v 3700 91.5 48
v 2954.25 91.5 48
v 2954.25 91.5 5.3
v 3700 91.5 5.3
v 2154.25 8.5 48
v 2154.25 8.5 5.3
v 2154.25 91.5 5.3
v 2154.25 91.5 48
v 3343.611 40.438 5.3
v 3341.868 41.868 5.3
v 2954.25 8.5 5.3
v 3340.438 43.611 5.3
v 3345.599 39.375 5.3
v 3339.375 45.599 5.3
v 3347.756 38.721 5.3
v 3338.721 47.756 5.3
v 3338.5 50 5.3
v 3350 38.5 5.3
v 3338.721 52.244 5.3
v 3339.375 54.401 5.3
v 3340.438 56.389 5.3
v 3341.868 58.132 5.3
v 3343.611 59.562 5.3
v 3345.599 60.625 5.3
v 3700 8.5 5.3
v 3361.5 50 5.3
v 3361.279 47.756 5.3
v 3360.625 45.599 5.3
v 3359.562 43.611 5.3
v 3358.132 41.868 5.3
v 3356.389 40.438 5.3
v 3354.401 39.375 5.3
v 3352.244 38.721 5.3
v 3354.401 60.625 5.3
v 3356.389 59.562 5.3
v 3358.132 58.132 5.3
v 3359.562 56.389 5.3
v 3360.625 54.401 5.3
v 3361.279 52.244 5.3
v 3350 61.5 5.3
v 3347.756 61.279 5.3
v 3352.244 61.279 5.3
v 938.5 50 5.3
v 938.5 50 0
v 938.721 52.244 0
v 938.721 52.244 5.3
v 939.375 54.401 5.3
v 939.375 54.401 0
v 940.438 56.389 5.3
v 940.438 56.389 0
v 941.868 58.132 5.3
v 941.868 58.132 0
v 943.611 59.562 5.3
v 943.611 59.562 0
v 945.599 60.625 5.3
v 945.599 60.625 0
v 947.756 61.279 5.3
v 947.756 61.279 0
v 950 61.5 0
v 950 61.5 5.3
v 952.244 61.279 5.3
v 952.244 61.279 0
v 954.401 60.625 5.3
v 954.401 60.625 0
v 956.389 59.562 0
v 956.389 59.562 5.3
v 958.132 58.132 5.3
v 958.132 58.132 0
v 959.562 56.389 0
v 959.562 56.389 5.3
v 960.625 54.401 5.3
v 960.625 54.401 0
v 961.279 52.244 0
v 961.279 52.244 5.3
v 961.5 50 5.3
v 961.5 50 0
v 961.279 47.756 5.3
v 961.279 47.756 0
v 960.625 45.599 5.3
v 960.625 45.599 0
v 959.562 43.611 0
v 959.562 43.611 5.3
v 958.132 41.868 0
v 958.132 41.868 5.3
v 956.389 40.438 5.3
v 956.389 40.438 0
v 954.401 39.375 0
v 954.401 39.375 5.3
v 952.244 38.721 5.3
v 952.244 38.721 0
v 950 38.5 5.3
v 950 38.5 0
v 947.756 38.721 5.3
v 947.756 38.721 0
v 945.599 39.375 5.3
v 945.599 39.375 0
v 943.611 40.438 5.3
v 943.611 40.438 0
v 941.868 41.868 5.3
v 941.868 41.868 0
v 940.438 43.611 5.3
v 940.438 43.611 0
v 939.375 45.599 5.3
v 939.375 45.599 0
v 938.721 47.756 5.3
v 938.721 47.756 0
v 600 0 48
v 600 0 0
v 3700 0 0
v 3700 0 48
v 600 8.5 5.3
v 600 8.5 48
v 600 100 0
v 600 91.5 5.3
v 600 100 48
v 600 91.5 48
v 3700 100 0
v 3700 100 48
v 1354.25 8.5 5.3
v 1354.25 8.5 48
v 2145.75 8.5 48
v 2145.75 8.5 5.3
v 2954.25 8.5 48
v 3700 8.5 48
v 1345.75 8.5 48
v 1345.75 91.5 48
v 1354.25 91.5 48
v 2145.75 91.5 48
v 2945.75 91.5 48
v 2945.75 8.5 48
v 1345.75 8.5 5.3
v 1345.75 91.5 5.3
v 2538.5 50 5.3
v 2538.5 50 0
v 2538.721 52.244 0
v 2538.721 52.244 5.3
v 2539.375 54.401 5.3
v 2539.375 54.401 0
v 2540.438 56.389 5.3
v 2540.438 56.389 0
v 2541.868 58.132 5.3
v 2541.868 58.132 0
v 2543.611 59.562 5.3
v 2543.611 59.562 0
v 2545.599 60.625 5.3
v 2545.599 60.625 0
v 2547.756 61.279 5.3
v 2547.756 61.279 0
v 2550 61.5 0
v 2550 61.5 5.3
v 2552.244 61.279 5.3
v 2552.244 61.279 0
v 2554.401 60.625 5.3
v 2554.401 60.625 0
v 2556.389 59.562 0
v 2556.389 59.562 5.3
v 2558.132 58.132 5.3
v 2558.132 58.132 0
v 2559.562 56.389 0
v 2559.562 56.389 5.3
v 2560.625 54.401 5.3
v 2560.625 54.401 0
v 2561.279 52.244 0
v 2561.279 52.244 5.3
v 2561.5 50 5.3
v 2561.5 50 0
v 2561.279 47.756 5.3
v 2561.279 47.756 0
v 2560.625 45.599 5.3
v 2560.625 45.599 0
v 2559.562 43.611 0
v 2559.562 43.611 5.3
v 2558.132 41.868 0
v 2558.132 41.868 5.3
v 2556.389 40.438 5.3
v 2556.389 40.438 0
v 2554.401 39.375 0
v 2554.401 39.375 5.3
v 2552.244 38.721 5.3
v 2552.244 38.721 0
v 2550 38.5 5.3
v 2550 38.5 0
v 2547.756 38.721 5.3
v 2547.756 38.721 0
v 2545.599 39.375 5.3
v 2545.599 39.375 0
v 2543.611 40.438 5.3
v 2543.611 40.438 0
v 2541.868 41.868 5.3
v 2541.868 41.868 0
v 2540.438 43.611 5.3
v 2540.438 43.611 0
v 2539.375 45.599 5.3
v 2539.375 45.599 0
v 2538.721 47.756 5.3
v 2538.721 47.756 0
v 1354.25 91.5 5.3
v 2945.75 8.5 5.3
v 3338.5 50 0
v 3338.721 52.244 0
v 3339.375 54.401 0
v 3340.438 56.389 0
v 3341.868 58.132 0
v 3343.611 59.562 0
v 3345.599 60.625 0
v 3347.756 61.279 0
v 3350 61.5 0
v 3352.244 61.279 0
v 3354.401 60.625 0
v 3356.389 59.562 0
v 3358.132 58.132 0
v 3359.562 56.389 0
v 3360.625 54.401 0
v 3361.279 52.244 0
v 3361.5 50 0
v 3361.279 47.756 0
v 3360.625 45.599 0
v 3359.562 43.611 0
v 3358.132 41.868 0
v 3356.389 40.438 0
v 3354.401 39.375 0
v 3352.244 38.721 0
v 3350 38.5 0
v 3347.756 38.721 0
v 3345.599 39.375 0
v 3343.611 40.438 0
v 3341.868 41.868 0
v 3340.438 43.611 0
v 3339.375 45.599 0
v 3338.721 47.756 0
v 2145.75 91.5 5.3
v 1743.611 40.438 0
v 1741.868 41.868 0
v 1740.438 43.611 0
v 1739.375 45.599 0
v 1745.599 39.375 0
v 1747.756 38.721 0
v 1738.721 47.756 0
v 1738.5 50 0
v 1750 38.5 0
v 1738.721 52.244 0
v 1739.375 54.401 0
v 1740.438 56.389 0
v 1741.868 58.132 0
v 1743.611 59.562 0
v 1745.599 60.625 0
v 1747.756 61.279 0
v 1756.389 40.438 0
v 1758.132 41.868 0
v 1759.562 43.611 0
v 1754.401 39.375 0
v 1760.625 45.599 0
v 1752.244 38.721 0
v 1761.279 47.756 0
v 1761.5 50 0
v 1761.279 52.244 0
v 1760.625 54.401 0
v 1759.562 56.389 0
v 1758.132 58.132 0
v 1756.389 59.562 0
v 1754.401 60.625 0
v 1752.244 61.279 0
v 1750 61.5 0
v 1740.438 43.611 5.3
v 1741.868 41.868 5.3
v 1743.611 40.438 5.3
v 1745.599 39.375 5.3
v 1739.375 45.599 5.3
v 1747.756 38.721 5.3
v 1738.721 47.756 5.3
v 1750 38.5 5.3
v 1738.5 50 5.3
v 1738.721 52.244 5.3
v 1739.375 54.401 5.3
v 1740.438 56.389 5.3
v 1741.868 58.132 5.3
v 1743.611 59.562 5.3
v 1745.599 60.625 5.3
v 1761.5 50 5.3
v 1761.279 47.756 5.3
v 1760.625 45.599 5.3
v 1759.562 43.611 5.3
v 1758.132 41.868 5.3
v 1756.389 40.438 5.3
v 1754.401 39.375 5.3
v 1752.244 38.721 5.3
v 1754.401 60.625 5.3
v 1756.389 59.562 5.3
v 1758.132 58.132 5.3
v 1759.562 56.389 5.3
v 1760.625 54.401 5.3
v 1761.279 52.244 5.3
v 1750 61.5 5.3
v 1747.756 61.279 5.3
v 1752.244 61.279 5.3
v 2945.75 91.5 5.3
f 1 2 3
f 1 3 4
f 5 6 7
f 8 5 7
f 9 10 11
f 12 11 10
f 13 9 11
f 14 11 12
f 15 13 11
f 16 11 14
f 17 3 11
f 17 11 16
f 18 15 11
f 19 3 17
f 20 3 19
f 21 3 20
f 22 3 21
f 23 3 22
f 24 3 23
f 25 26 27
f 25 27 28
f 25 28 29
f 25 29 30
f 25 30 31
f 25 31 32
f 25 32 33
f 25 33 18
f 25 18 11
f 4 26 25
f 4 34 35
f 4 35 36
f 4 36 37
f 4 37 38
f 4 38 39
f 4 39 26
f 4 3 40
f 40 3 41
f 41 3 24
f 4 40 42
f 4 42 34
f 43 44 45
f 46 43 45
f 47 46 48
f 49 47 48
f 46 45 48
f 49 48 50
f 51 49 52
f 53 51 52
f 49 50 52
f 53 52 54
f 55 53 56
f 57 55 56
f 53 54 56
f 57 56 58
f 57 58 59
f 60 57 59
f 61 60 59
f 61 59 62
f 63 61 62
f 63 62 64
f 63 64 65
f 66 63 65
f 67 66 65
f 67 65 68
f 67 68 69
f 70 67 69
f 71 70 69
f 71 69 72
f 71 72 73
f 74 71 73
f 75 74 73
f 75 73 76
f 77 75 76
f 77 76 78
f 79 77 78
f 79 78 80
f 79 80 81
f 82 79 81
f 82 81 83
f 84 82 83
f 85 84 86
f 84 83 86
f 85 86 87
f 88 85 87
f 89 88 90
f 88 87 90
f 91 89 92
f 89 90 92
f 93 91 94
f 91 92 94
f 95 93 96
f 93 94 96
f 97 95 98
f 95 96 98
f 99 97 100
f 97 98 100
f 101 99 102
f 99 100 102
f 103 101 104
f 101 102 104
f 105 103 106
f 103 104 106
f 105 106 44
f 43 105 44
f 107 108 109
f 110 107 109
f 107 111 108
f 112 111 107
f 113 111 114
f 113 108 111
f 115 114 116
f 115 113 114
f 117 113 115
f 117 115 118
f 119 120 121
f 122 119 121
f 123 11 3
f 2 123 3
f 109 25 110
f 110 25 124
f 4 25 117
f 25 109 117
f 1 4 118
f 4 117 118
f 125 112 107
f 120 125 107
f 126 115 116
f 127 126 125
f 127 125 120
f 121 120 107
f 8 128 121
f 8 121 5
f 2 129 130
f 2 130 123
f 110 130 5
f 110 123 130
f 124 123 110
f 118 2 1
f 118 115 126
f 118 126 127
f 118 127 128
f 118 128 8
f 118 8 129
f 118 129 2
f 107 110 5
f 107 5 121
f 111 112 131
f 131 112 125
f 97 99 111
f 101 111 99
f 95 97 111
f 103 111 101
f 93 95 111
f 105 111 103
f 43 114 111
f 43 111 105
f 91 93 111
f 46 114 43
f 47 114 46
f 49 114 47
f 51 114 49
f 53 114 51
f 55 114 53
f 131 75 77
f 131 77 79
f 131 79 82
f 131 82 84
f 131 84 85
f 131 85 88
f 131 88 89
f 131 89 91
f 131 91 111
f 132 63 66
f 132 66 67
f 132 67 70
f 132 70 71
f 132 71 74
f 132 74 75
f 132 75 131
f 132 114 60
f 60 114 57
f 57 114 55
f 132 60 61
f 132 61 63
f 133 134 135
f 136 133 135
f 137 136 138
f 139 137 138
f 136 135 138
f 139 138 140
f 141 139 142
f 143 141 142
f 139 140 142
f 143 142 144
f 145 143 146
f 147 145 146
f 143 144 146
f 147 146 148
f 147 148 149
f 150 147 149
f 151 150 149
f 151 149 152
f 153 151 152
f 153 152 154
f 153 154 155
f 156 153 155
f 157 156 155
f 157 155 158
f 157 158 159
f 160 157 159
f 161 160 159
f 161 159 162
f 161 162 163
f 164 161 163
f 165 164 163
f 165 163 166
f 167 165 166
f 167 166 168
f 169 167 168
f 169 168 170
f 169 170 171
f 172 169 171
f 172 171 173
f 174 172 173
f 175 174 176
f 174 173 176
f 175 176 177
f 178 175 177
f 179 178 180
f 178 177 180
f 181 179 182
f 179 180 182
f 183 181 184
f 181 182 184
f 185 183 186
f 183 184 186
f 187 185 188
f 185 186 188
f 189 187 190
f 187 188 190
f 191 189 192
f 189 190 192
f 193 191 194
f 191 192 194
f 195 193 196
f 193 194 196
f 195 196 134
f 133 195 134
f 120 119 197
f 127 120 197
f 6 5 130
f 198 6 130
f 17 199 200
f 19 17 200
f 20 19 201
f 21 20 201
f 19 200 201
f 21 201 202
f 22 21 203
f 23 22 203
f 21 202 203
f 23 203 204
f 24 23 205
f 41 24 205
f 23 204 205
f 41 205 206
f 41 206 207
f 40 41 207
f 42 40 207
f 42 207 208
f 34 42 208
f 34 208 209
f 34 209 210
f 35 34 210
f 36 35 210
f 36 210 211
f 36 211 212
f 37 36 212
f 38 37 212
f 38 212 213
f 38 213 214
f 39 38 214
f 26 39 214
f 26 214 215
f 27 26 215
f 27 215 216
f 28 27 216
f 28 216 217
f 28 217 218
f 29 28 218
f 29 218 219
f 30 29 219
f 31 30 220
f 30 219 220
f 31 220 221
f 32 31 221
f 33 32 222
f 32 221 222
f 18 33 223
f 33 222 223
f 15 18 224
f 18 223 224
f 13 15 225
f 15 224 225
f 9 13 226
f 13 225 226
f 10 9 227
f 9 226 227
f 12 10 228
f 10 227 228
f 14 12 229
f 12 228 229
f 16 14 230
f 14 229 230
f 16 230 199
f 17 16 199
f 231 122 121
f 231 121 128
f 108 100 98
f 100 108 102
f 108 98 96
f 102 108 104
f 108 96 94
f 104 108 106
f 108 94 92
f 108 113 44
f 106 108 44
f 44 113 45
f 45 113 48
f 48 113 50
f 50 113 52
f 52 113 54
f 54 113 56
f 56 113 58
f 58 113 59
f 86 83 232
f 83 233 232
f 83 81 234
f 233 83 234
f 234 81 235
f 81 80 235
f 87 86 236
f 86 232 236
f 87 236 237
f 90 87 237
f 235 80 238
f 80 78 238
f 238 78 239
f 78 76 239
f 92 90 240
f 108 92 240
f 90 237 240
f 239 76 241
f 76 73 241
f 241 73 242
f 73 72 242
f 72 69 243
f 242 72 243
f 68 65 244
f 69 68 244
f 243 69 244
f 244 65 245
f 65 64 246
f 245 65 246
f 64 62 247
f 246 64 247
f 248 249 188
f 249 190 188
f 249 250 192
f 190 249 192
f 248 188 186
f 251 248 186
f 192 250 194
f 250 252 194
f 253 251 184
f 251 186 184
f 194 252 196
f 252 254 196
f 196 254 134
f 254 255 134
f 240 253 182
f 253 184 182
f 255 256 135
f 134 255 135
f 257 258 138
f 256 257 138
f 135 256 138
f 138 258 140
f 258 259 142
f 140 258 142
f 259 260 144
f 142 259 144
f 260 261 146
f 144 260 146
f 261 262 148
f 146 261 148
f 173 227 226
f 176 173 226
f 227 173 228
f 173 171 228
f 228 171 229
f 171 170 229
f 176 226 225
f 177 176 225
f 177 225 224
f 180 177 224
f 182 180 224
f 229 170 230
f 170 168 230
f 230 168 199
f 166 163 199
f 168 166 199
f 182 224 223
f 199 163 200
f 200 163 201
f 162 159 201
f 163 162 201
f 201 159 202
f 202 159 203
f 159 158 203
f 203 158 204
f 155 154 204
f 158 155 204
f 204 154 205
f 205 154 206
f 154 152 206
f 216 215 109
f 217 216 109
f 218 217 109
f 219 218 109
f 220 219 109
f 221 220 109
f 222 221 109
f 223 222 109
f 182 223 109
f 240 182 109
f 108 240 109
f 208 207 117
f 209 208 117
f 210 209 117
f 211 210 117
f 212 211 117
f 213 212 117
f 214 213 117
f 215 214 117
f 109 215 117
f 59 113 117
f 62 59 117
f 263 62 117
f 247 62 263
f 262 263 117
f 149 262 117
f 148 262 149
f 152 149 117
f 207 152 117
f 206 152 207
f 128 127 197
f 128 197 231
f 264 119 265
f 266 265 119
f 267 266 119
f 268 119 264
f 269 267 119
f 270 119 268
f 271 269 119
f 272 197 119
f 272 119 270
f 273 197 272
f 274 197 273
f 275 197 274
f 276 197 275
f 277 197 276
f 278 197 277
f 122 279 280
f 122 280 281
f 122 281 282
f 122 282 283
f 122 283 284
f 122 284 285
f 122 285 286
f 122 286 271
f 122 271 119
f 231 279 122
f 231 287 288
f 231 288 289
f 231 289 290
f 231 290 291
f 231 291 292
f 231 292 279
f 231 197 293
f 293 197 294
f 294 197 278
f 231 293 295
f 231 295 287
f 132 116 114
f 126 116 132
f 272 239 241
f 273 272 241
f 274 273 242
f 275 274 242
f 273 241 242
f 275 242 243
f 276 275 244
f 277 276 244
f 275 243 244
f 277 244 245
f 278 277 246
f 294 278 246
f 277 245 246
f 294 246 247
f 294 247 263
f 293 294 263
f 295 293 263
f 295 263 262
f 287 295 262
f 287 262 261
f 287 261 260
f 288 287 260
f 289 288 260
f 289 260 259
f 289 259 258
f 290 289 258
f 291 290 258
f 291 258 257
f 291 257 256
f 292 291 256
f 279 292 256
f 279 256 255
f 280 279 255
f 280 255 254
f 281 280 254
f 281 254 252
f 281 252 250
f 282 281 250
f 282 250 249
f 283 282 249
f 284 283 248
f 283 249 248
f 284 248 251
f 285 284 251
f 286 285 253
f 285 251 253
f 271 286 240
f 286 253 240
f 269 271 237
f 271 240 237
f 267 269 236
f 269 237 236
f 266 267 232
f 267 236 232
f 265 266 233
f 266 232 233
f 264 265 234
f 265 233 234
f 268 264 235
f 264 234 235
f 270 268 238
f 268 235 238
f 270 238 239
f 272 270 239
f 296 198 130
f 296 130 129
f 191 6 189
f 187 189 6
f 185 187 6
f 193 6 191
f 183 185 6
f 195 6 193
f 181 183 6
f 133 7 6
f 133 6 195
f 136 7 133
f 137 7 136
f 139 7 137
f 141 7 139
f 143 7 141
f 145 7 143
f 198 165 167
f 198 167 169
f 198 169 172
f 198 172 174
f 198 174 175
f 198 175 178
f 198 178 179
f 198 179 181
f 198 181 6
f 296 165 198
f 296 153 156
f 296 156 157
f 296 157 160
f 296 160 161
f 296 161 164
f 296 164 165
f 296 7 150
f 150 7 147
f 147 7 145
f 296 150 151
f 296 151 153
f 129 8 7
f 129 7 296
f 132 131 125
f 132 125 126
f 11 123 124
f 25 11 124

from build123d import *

# Parameters (mm, degrees)
SKETCH_1_W             = 4300
SKETCH_1_H             = 100
EXTRUDE_1_DEPTH        = 48
SKETCH_2_W             = 4300
SKETCH_2_H             = 83
CUT_EXTRUDE_2_DEPTH    = 42.7
SKETCH_3_W             = 8.5
SKETCH_3_H             = 83
EXTRUDE_3_DEPTH        = 42.7
PATTERN_LINEAR_1_COUNT = 5
PATTERN_LINEAR_1_PITCH = 800
SKETCH_4_R             = 11.5
CUT_EXTRUDE_4_DEPTH    = 4302.430459742
PATTERN_LINEAR_2_COUNT = 6
PATTERN_LINEAR_2_PITCH = 800
SKETCH_5_W             = 600
SKETCH_5_H             = 48
CUT_EXTRUDE_1_DEPTH    = 100


with BuildPart() as part:
    # 草图1 → 拉伸1 (new body)
    with BuildSketch(Plane.XY):
        with Locations((2150, 50)):
            Rectangle(SKETCH_1_W, SKETCH_1_H)
    extrude(amount=EXTRUDE_1_DEPTH)

    # 草图2 → 拉伸2 (cut)
    with BuildSketch(Plane.XY.offset(48)):
        with Locations((2150, 50)):
            Rectangle(SKETCH_2_W, SKETCH_2_H)
    extrude(amount=-CUT_EXTRUDE_2_DEPTH, mode=Mode.SUBTRACT)

    # 草图3 → 拉伸3 (add)
    with BuildSketch(Plane.XY.offset(5.3)):
        with Locations((550, 50)):
            Rectangle(SKETCH_3_W, SKETCH_3_H)
    extrude_3 = extrude(amount=EXTRUDE_3_DEPTH)

    # 阵列(线性)1: 拉伸3 ×5
    with Locations(*[(i * PATTERN_LINEAR_1_PITCH, 0, 0) for i in range(1, PATTERN_LINEAR_1_COUNT)]):
        add(extrude_3)

    # 草图4 → 拉伸4 (cut, through all)
    with BuildSketch(Plane(origin=(0, 0, 0), x_dir=(-1, 0, 0), z_dir=(0, 0, -1))):
        with Locations((-4150, 50)):
            Circle(SKETCH_4_R)
    cut_extrude_4 = extrude(amount=-CUT_EXTRUDE_4_DEPTH, mode=Mode.SUBTRACT)

    # 阵列(线性)2: 拉伸4 ×6
    with Locations(*[(-i * PATTERN_LINEAR_2_PITCH, 0, 0) for i in range(1, PATTERN_LINEAR_2_COUNT)]):
        add(cut_extrude_4, mode=Mode.SUBTRACT)

    # 草图5 → 切除-拉伸1 (cut)
    with BuildSketch(Plane(origin=(0, 100, 0), x_dir=(-1, 0, 0), z_dir=(0, 1, 0))):
        with Locations((-300, 24)):
            Rectangle(SKETCH_5_W, SKETCH_5_H)
        with Locations((-4000, 24)):
            Rectangle(SKETCH_5_W, SKETCH_5_H)
    extrude(amount=-CUT_EXTRUDE_1_DEPTH, mode=Mode.SUBTRACT)


solid = part.part
